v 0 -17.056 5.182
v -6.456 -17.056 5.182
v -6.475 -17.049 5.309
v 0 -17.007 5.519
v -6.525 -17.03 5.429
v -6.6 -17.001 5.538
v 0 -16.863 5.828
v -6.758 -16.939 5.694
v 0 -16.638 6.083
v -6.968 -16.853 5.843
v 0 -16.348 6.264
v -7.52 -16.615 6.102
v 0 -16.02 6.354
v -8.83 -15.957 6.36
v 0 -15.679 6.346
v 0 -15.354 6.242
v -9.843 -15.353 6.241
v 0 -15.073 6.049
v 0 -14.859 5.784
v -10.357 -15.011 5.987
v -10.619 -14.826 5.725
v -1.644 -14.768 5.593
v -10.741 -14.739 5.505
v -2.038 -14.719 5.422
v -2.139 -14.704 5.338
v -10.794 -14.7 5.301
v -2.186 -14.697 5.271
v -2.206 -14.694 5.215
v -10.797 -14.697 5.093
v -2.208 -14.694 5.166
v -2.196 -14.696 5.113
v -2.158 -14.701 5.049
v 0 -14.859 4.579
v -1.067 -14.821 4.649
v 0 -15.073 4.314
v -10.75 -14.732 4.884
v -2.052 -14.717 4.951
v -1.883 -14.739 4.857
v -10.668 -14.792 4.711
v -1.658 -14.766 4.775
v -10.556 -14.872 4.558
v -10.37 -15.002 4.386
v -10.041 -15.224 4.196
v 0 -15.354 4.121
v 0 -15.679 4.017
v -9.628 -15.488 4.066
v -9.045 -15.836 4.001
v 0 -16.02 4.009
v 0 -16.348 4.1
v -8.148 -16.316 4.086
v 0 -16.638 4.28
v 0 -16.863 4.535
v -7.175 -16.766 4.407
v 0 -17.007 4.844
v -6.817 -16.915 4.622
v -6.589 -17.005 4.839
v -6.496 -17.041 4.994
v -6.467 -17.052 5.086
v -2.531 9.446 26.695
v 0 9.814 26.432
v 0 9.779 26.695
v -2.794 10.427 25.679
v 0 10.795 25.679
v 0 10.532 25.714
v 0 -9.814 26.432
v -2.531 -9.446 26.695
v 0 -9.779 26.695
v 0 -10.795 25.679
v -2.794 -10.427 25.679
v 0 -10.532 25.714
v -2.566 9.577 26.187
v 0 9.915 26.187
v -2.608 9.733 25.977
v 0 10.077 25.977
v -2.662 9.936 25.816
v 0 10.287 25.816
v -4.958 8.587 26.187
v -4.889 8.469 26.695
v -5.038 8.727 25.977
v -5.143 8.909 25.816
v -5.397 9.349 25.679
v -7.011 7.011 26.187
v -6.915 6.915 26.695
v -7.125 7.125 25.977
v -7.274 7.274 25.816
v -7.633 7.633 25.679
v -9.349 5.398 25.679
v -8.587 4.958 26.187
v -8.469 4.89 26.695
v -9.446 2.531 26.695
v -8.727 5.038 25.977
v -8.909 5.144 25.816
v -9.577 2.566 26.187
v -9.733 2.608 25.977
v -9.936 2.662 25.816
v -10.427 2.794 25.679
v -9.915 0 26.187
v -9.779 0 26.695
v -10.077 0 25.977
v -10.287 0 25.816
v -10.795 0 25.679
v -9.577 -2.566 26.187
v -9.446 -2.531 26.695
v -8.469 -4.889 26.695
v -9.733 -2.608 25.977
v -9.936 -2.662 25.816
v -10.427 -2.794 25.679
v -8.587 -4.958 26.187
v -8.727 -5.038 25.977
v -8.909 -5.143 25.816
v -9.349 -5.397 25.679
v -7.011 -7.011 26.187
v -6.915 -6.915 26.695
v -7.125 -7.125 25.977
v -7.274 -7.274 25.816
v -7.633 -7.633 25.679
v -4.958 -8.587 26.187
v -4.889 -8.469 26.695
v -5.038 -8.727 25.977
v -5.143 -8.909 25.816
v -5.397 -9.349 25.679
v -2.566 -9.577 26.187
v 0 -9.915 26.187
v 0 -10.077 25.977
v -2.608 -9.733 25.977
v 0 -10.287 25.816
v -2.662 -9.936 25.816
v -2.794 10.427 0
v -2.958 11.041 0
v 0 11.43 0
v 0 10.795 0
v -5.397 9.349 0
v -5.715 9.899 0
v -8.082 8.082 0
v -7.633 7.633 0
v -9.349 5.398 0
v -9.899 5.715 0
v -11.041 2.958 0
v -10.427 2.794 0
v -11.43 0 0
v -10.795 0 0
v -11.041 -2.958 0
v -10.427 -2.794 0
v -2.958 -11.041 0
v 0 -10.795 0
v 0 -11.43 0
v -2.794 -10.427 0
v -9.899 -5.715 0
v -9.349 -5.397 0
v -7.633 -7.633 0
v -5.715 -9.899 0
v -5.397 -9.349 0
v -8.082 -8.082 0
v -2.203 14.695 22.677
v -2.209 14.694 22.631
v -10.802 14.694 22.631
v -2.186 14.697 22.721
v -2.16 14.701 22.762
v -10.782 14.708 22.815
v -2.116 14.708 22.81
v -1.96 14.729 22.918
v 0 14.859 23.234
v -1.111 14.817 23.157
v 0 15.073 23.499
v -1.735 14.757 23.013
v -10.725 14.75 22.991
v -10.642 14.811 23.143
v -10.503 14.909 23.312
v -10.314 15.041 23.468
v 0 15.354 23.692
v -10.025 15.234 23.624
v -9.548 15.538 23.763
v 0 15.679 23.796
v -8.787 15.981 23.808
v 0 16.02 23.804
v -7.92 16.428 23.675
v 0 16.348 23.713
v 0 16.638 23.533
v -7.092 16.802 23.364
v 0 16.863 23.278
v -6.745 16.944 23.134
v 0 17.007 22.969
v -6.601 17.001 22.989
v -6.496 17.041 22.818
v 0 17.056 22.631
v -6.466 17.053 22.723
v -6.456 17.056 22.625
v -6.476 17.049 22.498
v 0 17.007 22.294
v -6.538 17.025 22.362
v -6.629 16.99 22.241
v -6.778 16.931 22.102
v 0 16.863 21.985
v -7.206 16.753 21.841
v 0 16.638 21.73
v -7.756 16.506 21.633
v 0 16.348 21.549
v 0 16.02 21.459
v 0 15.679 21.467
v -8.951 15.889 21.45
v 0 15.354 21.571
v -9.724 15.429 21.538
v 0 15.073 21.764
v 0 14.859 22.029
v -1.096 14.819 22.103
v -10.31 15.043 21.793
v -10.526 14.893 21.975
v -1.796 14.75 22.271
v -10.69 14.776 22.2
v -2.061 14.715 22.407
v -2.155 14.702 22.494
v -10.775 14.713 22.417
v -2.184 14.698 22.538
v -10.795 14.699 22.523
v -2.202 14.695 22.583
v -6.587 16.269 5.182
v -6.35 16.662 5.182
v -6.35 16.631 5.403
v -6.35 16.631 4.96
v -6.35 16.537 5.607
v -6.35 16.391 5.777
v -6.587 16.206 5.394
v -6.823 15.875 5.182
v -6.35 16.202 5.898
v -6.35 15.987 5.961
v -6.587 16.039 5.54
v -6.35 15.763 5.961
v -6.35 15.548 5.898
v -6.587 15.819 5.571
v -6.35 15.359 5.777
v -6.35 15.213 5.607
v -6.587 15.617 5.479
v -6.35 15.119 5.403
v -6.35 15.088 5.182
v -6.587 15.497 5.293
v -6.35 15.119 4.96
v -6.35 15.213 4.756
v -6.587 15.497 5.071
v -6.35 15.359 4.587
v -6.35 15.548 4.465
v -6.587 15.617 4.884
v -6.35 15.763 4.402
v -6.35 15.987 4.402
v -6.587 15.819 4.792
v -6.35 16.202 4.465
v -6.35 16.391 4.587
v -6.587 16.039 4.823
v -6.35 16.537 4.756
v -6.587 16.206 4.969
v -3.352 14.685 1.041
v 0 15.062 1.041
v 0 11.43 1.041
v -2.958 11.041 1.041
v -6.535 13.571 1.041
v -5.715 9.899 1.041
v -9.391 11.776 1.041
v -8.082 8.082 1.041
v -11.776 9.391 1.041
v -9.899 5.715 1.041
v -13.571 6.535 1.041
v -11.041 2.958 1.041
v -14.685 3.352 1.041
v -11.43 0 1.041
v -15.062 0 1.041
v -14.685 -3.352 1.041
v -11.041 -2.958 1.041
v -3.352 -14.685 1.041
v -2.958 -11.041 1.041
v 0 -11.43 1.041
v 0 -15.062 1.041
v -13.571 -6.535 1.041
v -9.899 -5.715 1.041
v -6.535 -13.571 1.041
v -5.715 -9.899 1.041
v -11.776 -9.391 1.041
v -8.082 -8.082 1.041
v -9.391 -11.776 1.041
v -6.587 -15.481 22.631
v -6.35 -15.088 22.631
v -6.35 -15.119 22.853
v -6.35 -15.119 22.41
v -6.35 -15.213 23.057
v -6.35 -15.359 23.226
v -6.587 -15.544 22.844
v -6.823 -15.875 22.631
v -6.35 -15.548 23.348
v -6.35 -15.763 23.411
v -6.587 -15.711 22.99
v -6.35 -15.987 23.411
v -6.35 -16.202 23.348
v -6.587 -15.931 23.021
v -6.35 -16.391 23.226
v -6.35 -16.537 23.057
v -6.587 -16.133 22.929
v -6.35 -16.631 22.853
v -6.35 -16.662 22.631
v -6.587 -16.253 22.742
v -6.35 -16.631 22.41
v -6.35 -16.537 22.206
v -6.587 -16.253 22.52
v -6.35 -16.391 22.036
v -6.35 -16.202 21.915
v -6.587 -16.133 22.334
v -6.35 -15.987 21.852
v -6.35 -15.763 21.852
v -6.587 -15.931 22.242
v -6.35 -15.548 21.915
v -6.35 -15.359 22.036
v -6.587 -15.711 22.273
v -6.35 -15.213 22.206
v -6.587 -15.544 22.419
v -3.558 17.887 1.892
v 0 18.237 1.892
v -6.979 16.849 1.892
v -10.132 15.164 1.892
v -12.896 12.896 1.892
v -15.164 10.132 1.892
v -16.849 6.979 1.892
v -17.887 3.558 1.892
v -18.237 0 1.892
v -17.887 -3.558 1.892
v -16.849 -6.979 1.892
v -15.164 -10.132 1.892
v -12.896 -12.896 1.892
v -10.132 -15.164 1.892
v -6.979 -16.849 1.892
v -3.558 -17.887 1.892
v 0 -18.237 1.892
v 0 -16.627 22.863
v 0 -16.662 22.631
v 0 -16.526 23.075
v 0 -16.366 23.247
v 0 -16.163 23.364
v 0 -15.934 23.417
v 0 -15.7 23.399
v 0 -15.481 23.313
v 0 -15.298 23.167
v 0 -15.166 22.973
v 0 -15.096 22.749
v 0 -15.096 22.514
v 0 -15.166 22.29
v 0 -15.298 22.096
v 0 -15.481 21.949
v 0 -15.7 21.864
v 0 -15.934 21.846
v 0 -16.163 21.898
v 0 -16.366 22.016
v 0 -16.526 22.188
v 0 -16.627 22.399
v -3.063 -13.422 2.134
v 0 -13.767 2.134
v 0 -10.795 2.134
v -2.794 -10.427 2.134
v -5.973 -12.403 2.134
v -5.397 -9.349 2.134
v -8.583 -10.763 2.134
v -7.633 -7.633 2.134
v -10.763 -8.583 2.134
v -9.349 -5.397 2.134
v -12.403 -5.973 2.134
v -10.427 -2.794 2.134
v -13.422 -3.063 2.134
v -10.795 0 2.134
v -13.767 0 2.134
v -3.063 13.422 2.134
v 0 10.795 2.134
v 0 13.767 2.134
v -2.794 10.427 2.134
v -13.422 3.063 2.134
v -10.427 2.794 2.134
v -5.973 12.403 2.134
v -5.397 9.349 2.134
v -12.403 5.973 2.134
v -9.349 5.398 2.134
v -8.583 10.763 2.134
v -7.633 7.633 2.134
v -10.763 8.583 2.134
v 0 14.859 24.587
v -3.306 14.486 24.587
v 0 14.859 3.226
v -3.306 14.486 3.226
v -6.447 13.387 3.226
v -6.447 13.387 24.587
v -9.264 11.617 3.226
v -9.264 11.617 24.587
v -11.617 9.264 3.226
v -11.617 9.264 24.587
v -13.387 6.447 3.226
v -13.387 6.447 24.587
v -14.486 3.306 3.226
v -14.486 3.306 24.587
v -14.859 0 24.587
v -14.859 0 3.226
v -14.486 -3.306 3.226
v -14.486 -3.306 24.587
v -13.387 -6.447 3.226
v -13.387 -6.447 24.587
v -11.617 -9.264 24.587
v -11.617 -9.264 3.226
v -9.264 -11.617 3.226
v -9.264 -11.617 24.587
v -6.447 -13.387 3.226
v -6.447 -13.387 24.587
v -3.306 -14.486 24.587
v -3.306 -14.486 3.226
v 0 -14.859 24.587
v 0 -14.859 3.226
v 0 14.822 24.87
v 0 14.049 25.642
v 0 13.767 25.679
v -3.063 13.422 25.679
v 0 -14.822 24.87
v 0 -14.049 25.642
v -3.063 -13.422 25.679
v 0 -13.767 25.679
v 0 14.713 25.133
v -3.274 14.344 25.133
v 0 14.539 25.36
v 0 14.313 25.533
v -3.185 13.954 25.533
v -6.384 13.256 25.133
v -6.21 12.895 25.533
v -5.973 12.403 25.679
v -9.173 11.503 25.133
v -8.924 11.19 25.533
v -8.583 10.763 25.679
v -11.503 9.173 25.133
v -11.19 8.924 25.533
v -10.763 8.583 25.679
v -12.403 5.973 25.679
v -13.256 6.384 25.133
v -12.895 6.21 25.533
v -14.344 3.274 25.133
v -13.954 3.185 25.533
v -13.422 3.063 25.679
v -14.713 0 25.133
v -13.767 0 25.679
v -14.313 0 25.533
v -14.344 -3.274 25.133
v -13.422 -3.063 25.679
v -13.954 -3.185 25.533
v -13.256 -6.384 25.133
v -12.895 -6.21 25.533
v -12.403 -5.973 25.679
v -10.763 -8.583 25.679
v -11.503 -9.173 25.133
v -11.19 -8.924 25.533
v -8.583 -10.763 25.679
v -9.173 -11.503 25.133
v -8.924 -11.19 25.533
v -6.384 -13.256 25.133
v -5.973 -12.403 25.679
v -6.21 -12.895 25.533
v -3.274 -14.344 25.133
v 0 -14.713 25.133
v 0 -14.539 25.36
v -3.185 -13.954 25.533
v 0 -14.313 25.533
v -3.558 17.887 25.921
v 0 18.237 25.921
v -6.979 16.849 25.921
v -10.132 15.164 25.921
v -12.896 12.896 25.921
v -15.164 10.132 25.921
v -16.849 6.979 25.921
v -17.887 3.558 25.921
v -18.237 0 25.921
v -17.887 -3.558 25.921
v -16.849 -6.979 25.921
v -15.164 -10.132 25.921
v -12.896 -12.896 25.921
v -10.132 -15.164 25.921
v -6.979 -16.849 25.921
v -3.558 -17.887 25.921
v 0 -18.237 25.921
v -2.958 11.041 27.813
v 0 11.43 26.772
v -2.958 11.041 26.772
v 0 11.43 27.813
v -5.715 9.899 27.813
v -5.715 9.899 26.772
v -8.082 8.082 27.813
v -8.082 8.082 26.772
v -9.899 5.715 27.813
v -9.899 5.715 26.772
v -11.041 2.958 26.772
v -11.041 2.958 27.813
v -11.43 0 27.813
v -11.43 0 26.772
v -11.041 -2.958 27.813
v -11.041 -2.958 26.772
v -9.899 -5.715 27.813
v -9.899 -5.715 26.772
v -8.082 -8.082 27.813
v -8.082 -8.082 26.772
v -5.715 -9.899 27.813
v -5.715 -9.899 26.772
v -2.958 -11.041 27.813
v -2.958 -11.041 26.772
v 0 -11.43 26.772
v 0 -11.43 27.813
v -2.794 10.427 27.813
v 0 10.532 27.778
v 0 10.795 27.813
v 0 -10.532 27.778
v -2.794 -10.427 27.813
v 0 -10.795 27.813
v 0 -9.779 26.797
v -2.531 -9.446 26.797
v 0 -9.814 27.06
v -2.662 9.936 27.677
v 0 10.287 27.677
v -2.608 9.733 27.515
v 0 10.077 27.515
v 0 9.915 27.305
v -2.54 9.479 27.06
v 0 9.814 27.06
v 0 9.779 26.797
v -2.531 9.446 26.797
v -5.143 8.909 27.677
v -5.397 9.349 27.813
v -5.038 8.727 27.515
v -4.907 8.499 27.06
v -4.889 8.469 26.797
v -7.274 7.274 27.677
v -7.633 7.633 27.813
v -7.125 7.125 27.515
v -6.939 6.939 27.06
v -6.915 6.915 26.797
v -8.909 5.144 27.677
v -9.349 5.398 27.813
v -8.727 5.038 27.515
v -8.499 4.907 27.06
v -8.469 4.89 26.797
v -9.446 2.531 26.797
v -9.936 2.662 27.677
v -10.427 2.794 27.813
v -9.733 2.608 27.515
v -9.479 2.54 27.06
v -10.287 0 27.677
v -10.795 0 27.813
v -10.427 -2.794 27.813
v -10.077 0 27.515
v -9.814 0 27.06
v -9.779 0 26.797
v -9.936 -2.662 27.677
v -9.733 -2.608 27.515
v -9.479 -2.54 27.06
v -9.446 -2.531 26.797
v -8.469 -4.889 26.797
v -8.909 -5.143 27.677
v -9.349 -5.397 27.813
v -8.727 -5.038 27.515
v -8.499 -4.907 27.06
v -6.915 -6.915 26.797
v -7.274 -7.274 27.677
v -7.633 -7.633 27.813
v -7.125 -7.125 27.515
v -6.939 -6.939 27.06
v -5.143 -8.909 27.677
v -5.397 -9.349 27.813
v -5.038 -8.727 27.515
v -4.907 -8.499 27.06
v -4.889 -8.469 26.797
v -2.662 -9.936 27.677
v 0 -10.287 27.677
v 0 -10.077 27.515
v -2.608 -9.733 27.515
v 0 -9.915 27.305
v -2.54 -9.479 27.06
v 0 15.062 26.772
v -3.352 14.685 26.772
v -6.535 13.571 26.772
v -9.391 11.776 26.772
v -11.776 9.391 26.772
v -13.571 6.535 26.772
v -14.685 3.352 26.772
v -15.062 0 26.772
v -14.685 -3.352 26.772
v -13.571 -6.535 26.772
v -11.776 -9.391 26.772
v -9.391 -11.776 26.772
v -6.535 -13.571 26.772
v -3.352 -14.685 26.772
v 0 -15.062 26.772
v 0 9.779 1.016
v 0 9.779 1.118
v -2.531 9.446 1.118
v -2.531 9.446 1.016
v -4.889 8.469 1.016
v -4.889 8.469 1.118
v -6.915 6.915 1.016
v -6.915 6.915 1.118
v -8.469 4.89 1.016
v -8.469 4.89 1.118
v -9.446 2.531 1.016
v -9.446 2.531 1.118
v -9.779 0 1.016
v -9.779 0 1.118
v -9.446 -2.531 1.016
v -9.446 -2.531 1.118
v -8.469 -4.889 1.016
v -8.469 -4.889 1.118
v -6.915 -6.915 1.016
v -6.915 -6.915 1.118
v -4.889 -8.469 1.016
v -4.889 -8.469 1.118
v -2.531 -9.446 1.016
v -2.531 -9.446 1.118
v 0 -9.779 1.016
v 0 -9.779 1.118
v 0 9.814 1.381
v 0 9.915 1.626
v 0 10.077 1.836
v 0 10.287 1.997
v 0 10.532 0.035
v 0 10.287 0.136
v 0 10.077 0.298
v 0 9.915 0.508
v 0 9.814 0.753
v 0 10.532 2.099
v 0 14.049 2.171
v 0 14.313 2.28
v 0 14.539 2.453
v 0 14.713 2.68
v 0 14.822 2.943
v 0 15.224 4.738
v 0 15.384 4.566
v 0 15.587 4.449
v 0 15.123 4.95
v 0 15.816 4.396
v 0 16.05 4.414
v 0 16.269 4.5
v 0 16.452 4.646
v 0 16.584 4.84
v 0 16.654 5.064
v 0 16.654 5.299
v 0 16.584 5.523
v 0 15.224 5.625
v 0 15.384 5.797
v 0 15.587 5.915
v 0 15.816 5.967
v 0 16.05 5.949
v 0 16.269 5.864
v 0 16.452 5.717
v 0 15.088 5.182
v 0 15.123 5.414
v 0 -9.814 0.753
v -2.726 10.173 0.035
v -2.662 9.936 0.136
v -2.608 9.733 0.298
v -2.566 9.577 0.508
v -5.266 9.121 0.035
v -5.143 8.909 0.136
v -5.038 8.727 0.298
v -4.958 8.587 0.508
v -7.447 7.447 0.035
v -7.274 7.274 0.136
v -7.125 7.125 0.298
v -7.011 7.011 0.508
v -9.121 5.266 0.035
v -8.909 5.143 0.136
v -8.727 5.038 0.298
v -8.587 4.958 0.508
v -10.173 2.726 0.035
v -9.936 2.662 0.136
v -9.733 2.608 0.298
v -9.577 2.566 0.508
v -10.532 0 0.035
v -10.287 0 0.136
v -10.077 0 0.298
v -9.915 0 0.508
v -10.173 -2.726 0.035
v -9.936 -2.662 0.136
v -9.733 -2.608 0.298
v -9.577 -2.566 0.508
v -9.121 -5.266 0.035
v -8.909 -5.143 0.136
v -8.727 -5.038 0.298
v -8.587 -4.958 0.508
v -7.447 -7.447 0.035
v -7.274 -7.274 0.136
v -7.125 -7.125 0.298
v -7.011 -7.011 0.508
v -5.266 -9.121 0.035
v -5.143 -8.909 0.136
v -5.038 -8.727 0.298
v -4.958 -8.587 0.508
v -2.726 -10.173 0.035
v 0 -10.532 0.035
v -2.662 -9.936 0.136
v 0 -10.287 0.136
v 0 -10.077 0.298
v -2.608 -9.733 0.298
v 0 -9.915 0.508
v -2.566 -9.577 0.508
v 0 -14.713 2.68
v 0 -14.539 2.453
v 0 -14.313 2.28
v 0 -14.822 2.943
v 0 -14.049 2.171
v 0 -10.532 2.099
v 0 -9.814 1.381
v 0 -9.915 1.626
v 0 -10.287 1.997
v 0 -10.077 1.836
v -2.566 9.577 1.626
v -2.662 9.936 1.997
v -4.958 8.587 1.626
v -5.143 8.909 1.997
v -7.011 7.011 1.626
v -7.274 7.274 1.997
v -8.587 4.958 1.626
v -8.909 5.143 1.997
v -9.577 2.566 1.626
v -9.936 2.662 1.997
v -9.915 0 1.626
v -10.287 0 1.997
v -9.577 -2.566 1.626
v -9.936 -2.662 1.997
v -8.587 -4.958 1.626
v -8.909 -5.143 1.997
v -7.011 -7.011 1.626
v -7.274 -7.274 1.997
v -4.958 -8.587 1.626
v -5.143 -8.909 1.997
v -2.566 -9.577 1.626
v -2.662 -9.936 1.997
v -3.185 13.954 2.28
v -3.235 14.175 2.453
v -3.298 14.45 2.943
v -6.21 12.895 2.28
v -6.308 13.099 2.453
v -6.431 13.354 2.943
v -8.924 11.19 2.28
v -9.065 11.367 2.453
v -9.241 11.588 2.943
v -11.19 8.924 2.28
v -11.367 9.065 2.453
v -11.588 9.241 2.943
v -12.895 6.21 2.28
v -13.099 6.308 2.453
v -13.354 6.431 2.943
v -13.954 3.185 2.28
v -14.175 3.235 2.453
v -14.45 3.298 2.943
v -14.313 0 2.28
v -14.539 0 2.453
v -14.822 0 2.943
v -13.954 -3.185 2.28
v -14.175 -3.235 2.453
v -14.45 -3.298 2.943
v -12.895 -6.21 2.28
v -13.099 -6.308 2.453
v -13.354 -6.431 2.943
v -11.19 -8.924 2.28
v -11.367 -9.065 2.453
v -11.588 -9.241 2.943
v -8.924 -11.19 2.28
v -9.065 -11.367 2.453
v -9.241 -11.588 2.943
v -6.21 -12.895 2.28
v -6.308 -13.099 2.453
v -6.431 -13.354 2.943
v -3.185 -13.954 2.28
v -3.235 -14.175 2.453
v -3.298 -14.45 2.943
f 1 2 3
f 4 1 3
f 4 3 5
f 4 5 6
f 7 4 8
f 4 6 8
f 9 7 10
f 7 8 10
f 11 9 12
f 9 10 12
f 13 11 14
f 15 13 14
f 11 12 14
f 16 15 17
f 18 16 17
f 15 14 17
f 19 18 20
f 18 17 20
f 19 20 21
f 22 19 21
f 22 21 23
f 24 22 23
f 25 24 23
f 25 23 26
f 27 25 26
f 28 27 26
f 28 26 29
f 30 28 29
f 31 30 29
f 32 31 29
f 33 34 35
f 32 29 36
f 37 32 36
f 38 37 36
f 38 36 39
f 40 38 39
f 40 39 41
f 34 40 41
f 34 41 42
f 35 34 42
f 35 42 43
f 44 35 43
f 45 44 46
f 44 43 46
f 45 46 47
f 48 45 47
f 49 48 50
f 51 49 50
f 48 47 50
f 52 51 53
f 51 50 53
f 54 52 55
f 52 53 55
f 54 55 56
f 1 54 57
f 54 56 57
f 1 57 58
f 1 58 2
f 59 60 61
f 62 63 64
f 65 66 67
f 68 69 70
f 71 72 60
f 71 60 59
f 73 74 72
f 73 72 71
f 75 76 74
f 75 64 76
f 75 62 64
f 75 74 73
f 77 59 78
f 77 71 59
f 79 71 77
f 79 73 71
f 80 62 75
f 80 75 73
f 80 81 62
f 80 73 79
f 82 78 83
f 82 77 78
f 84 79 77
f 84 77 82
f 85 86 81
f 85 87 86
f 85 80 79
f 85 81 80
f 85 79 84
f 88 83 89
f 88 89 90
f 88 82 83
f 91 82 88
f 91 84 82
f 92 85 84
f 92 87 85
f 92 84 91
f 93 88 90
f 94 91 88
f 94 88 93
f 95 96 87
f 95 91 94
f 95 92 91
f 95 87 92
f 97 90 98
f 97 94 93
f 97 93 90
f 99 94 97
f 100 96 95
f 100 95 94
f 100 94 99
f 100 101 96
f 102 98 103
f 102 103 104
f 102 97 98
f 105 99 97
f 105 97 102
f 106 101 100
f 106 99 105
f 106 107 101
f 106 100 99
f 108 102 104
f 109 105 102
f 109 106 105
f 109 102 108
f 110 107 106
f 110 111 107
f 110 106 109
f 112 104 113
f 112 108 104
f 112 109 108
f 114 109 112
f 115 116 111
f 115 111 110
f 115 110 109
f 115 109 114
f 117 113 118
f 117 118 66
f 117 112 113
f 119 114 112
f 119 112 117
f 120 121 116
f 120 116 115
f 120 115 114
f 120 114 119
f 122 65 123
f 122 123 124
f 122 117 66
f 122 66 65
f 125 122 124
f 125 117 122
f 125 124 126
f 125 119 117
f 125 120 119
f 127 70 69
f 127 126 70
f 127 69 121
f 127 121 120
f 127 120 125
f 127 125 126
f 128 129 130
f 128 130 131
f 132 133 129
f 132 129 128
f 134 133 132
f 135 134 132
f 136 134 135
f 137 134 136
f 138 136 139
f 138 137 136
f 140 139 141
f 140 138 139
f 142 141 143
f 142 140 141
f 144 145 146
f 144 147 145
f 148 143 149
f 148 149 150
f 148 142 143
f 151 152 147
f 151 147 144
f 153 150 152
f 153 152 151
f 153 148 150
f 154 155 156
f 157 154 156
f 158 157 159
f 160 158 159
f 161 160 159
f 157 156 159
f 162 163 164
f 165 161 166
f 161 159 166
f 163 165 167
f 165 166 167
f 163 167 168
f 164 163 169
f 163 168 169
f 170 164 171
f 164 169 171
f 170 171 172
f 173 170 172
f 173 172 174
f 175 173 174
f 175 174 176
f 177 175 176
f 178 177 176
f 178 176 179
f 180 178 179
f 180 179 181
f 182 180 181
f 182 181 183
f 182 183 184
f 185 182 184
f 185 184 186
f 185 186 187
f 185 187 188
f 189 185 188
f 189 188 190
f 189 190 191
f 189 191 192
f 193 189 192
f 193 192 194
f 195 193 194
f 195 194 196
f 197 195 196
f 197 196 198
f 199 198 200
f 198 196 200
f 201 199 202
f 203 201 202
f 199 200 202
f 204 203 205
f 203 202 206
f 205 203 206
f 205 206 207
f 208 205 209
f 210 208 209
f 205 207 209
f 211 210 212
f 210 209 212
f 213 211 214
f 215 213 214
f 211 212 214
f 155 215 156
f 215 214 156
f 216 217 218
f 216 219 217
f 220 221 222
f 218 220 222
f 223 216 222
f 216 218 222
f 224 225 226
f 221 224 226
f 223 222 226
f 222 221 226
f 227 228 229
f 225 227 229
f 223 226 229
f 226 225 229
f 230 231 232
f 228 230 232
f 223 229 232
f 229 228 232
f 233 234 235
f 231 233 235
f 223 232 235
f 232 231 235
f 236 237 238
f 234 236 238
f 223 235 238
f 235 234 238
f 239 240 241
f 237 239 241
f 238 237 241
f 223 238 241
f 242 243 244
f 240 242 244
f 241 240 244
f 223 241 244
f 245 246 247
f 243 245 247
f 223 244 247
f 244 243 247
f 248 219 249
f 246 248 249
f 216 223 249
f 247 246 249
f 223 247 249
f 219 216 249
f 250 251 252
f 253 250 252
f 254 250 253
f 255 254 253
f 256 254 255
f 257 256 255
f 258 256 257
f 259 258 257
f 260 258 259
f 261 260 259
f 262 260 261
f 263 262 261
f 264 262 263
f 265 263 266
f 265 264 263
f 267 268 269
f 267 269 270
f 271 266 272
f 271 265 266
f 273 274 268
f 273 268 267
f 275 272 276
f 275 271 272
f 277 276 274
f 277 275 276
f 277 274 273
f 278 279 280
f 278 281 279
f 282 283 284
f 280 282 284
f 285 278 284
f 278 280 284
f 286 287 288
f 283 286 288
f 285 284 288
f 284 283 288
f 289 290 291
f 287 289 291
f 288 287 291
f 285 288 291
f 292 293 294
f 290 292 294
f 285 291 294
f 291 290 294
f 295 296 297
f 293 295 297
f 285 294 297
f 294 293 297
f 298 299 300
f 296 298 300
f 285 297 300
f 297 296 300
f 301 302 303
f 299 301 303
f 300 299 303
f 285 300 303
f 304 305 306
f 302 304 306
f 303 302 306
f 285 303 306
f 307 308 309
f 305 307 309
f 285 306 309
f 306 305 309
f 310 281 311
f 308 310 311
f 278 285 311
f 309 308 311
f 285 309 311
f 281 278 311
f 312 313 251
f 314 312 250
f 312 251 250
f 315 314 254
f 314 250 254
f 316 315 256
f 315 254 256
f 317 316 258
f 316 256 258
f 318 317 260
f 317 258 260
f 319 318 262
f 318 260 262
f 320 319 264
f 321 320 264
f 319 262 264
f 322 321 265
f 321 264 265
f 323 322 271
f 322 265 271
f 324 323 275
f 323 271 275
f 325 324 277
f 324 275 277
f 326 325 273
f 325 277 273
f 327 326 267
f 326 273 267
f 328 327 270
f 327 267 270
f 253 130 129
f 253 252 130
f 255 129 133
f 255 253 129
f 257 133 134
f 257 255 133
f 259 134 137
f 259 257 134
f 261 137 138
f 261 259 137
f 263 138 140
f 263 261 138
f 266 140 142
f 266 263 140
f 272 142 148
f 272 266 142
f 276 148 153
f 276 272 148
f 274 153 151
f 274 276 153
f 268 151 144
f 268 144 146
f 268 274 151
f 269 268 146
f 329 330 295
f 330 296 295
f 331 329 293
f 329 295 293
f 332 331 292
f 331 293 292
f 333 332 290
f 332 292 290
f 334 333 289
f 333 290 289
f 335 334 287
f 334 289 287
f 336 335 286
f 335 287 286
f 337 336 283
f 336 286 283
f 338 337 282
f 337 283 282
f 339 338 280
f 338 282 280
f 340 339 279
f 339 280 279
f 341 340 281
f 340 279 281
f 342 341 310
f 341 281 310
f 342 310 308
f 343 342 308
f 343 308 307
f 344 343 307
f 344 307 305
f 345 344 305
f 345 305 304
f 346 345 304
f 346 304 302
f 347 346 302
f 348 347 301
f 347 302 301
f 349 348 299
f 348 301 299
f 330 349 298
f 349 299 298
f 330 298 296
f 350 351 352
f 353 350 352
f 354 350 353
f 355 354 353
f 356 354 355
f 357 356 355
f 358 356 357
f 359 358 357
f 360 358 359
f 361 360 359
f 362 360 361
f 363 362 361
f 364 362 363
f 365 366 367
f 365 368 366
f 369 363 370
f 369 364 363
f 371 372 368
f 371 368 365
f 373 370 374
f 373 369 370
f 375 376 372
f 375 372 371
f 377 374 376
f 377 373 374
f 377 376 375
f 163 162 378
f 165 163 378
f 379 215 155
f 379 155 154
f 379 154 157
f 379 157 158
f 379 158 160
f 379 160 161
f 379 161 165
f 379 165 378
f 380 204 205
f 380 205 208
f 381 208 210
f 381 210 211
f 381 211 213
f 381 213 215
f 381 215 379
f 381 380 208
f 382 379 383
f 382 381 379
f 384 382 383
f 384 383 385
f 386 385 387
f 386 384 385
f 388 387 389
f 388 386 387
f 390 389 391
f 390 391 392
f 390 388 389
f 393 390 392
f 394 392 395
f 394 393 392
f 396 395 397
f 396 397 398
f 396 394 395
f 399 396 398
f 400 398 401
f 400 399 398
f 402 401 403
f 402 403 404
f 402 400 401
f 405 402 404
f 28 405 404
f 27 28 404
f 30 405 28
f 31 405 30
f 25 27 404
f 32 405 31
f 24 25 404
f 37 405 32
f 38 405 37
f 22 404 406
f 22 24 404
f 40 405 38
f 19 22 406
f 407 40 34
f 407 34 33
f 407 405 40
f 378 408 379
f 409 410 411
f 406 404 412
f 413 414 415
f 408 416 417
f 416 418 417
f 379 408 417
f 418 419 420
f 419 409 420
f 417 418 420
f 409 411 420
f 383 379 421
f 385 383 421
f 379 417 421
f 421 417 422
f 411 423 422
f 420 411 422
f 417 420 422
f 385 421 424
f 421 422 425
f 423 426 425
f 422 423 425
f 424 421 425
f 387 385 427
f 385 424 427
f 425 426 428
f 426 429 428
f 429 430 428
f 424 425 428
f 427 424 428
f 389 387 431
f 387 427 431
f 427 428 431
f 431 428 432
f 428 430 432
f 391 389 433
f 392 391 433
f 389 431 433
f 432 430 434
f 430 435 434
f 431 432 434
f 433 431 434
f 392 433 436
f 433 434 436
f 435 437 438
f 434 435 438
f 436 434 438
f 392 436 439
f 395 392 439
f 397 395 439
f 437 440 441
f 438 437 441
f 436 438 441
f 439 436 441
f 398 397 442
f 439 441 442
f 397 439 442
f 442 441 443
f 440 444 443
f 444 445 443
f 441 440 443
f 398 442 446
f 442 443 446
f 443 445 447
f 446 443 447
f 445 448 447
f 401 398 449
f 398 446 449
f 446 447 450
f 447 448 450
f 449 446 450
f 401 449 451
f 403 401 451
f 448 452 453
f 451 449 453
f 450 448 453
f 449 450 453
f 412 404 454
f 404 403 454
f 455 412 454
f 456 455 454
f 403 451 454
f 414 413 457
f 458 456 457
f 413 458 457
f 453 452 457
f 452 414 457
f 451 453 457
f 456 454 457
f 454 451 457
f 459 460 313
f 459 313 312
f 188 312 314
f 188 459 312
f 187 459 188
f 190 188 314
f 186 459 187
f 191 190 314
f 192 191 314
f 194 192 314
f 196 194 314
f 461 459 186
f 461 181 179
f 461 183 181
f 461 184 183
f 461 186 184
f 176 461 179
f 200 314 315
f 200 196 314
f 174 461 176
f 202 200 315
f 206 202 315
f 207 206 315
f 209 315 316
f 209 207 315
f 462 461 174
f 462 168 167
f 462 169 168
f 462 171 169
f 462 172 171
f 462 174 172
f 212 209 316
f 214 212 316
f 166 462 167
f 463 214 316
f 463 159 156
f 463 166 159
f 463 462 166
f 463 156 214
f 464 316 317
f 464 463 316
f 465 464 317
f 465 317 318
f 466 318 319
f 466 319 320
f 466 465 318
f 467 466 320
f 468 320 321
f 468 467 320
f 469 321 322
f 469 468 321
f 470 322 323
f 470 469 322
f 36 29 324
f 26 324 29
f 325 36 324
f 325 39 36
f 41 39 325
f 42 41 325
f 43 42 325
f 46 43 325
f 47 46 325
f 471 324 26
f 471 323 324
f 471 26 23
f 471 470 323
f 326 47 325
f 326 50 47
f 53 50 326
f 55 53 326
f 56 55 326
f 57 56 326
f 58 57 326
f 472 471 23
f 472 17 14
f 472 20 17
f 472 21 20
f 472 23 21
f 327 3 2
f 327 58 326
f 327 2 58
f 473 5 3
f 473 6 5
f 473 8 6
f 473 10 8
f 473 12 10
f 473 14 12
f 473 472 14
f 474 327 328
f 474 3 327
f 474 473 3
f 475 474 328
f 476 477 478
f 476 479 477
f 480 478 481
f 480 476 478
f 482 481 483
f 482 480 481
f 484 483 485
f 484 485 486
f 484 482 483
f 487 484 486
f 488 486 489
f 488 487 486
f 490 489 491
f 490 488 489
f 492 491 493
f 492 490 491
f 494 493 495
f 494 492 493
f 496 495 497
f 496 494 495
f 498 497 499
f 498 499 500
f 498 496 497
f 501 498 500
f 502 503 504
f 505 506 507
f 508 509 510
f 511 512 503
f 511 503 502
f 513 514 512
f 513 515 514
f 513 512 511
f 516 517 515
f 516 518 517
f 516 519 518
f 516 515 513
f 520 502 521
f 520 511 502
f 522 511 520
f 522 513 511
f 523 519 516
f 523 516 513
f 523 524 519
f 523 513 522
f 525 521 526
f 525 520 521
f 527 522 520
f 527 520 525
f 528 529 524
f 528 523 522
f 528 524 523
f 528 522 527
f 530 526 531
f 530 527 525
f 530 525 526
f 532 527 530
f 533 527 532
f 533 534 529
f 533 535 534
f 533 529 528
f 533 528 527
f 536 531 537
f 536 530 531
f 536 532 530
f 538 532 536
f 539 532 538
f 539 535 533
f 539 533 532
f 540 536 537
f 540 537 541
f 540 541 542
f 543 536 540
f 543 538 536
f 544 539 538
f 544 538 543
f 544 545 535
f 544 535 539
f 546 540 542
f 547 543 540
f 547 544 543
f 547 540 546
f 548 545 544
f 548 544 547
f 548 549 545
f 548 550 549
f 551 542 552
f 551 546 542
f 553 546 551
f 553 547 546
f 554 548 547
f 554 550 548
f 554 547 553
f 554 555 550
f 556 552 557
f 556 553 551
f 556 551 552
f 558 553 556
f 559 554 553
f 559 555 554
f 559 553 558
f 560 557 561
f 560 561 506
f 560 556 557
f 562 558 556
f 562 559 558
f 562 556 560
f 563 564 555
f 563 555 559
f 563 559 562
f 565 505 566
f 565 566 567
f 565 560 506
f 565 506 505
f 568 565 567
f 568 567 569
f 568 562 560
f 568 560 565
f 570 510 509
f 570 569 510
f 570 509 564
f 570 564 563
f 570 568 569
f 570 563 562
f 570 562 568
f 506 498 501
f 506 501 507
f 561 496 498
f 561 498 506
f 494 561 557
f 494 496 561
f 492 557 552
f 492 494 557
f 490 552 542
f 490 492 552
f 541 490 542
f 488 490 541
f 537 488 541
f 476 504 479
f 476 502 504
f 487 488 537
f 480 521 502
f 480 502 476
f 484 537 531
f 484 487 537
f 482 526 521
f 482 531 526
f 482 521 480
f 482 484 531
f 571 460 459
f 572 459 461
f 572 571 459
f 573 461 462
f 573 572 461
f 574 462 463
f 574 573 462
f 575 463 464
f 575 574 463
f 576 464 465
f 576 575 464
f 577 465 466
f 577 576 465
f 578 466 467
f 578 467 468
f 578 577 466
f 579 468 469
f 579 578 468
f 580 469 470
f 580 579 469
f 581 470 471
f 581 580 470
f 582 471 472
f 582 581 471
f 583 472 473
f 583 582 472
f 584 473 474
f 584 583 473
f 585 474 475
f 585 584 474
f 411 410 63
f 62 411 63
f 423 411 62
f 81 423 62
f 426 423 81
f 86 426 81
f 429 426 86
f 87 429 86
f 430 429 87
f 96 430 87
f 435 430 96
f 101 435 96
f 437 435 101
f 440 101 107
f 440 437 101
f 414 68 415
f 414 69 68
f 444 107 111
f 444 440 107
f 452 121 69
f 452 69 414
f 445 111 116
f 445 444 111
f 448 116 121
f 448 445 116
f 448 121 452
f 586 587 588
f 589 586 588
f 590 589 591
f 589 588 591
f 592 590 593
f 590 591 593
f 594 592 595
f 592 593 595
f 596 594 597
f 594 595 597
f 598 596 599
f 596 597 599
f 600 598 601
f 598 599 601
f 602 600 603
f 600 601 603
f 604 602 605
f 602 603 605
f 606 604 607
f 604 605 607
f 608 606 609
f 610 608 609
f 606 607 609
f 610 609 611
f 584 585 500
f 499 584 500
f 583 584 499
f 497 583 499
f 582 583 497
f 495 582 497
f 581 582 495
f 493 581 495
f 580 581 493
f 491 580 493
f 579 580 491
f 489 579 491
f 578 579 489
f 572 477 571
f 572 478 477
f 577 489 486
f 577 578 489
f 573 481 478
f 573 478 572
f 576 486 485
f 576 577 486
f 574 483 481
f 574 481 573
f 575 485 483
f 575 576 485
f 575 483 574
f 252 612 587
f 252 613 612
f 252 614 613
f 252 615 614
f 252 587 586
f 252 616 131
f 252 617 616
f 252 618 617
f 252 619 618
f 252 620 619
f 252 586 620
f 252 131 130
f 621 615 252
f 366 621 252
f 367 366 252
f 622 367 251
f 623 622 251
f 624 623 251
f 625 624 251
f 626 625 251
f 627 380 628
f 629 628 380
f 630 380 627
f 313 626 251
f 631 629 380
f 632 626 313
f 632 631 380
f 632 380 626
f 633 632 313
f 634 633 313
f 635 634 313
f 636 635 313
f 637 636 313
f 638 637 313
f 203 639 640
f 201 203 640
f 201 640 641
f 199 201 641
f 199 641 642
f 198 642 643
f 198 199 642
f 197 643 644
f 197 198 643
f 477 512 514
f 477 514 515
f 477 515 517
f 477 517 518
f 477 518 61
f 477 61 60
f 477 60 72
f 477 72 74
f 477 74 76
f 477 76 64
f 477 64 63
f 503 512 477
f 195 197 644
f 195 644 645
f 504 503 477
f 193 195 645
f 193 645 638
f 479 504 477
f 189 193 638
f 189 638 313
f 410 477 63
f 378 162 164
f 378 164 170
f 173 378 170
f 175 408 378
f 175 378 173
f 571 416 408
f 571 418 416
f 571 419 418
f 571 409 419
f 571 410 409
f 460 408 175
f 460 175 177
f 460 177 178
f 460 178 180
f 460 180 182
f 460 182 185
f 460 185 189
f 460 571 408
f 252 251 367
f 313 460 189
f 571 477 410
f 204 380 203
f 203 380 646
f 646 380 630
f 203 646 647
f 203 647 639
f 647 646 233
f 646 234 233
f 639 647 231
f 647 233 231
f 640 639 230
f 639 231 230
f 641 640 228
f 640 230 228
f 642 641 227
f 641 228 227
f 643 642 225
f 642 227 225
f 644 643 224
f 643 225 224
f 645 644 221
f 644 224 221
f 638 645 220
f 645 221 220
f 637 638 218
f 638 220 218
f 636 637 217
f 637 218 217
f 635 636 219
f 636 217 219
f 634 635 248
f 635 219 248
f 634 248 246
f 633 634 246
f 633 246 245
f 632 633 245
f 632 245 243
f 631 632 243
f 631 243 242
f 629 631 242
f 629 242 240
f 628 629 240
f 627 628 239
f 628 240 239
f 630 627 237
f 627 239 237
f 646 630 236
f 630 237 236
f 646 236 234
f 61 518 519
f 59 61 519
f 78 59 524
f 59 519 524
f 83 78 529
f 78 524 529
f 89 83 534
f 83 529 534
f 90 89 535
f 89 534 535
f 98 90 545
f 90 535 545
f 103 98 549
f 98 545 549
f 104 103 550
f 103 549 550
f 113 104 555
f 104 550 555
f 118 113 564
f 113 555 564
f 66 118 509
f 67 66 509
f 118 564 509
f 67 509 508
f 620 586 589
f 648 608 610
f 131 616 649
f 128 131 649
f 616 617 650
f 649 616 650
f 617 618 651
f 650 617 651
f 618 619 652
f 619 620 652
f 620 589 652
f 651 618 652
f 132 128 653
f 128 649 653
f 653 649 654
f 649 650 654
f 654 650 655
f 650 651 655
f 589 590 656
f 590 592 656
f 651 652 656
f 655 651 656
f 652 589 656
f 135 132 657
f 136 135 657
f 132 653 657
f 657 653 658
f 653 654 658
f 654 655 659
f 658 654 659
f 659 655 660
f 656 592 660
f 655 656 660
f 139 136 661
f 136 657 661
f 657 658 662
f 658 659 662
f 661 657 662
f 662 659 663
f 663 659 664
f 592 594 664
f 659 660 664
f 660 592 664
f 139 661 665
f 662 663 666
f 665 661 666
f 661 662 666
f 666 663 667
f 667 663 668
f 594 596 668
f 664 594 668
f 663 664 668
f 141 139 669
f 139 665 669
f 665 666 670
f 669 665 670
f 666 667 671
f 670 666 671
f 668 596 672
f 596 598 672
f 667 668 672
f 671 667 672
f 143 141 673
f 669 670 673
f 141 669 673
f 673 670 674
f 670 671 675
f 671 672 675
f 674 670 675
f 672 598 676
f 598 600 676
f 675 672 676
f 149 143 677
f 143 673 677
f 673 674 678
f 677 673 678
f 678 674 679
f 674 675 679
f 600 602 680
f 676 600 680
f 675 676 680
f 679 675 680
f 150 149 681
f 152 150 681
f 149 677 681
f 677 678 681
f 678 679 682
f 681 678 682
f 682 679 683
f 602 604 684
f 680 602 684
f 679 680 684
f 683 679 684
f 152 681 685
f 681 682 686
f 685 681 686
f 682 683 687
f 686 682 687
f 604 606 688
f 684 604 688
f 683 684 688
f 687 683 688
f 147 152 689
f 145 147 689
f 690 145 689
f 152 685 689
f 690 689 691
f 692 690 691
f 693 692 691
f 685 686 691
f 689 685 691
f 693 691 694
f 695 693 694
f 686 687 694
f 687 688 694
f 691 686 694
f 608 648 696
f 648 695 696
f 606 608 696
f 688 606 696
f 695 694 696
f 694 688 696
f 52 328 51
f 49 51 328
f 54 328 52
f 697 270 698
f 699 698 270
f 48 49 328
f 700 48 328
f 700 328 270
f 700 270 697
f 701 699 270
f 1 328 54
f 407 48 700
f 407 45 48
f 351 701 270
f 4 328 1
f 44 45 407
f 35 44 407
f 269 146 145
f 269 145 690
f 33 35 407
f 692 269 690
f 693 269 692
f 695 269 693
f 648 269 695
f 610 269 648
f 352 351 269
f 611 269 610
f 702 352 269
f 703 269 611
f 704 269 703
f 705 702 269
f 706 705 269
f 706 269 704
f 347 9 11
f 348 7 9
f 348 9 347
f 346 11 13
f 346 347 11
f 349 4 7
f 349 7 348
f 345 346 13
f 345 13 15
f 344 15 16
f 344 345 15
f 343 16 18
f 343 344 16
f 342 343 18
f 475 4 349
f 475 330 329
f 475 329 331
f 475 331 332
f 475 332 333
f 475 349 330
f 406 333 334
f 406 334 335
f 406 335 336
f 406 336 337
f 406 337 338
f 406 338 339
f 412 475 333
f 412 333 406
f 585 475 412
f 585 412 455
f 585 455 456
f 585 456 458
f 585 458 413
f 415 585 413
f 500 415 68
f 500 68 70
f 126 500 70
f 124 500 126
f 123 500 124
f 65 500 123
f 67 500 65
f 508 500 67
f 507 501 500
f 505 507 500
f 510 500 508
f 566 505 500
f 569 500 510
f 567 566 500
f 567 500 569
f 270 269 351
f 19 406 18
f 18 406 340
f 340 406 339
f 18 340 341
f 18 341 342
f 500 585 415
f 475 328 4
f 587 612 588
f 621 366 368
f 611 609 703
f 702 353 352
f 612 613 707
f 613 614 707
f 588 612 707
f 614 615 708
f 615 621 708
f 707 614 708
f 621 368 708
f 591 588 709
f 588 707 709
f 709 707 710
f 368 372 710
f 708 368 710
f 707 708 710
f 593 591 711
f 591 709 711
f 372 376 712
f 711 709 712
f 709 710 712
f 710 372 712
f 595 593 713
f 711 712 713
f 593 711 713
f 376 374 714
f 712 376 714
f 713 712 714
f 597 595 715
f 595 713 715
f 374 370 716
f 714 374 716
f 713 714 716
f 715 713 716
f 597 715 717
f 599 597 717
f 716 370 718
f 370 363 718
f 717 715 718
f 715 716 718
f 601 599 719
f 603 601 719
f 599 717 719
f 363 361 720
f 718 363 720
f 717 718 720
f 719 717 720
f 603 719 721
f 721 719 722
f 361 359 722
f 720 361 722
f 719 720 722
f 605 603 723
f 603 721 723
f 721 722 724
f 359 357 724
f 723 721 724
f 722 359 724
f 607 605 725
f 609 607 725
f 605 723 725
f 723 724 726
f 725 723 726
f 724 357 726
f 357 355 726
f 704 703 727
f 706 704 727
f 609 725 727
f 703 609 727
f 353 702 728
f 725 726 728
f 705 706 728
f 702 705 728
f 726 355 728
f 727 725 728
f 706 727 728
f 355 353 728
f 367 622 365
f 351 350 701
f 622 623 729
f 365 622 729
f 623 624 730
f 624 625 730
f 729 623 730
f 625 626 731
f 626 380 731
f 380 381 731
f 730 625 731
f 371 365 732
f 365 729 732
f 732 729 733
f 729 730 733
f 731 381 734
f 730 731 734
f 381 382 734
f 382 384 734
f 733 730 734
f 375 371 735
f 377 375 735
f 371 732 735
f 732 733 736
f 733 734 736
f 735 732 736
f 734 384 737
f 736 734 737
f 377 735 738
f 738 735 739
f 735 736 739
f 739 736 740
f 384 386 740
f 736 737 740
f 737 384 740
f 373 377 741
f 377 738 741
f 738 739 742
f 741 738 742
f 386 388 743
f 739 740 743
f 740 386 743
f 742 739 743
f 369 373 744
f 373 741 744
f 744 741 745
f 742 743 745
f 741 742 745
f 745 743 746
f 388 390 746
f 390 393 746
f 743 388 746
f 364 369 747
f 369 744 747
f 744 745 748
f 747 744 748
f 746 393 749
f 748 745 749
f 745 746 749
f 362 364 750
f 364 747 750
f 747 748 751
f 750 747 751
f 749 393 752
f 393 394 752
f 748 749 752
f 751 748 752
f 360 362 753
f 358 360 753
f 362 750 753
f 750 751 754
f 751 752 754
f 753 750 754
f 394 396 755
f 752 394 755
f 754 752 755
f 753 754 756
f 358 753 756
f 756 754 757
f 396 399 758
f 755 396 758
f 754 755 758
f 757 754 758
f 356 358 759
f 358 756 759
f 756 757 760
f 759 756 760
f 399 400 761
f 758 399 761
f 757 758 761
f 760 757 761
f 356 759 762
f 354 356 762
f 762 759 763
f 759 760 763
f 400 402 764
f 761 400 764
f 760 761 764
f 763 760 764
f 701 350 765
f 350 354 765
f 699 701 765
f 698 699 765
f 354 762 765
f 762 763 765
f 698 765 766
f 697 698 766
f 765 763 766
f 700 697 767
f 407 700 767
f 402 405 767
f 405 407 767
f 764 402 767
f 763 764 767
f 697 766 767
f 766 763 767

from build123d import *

# Parameters (mm, degrees)
F1_ANGLE = 180
F3_DEPTH = 27.813
F4_R     = 1.016
F5_R     = 1.0922
F7_D     = 2.3622
F8_D     = 1.5748
F8_DEPTH = 6.35
F8_TIP   = 0.4731176514
F9_SIZE2 = 3.175
F9_SIZE  = 0.850738686


with BuildPart() as f1:
    # F0 (on Right) → F1 (revolve)
    with BuildSketch(Plane.YZ):
        Polygon((0, 2.1336), (0, 0), (11.43, 0), (11.43, 1.0414), (18.2372, 1.0414), (18.2372, 26.7716), (11.43, 26.7716), (11.43, 27.813), (0, 27.813), (0, 25.6794), (14.859, 25.6794), (14.859, 2.1336), align=None)
    revolve(axis=Axis((0, 0, 26.7462), (0, 0, 1)), revolution_arc=F1_ANGLE)

    # F2 (on face) → F3 (cut)
    with BuildSketch(Plane.XY.offset(27.813)):
        with BuildLine():
            ThreePointArc((0, -9.779), (6.9147972132, -6.9147972132), (9.779, 0))
            ThreePointArc((9.779, 0), (6.9147972132, 6.9147972132), (0, 9.779))
            Line((0, 9.779), (0, -9.779))
        make_face()
        with BuildLine():
            Line((0, -9.779), (0, 9.779))
            ThreePointArc((0, 9.779), (-9.779, 0), (0, -9.779))
        make_face()
    extrude(amount=-F3_DEPTH, mode=Mode.SUBTRACT)

    # F4
    f4_edges = [f1.edges().sort_by_distance(p)[0] for p in [
        (-9.779, 0, 27.813),
        (-9.779, 0, 25.6794),
        (-9.779, 0, 2.1336),
        (-9.779, 0, 0),
    ]]
    fillet(f4_edges, radius=F4_R)

    # F5
    f5_edges = [f1.edges().sort_by_distance(p)[0] for p in [
        (-14.859, 0, 25.6794),
        (-14.859, 0, 2.1336),
    ]]
    fillet(f5_edges, radius=F5_R)

    # F7 (through all)
    with Locations(Plane.YZ):
        with Locations((15.875, 22.6314), (-15.875, 5.1816)):
            Hole(F7_D / 2)

    # F8
    with Locations(Plane.YZ):
        with Locations((15.875, 5.1816), (-15.875, 22.6314)):
            Hole(F8_D / 2, depth=F8_DEPTH)
            with Locations((0, 0, -(F8_DEPTH + F8_TIP / 2))):  # 118° drill point
                Cone(0, F8_D / 2, F8_TIP, mode=Mode.SUBTRACT)

    # F9
    f9_edges = [f1.edges().sort_by_distance(p)[0] for p in [
        (-18.2372, 0, 1.0414),
        (-18.2372, 0, 26.7716),
    ]]
    f9_side = f1.faces().sort_by_distance((-18.2372, 0, 13.9065))[0]
    chamfer(f9_edges, length=F9_SIZE, length2=F9_SIZE2, reference=f9_side)


solid = f1.part
